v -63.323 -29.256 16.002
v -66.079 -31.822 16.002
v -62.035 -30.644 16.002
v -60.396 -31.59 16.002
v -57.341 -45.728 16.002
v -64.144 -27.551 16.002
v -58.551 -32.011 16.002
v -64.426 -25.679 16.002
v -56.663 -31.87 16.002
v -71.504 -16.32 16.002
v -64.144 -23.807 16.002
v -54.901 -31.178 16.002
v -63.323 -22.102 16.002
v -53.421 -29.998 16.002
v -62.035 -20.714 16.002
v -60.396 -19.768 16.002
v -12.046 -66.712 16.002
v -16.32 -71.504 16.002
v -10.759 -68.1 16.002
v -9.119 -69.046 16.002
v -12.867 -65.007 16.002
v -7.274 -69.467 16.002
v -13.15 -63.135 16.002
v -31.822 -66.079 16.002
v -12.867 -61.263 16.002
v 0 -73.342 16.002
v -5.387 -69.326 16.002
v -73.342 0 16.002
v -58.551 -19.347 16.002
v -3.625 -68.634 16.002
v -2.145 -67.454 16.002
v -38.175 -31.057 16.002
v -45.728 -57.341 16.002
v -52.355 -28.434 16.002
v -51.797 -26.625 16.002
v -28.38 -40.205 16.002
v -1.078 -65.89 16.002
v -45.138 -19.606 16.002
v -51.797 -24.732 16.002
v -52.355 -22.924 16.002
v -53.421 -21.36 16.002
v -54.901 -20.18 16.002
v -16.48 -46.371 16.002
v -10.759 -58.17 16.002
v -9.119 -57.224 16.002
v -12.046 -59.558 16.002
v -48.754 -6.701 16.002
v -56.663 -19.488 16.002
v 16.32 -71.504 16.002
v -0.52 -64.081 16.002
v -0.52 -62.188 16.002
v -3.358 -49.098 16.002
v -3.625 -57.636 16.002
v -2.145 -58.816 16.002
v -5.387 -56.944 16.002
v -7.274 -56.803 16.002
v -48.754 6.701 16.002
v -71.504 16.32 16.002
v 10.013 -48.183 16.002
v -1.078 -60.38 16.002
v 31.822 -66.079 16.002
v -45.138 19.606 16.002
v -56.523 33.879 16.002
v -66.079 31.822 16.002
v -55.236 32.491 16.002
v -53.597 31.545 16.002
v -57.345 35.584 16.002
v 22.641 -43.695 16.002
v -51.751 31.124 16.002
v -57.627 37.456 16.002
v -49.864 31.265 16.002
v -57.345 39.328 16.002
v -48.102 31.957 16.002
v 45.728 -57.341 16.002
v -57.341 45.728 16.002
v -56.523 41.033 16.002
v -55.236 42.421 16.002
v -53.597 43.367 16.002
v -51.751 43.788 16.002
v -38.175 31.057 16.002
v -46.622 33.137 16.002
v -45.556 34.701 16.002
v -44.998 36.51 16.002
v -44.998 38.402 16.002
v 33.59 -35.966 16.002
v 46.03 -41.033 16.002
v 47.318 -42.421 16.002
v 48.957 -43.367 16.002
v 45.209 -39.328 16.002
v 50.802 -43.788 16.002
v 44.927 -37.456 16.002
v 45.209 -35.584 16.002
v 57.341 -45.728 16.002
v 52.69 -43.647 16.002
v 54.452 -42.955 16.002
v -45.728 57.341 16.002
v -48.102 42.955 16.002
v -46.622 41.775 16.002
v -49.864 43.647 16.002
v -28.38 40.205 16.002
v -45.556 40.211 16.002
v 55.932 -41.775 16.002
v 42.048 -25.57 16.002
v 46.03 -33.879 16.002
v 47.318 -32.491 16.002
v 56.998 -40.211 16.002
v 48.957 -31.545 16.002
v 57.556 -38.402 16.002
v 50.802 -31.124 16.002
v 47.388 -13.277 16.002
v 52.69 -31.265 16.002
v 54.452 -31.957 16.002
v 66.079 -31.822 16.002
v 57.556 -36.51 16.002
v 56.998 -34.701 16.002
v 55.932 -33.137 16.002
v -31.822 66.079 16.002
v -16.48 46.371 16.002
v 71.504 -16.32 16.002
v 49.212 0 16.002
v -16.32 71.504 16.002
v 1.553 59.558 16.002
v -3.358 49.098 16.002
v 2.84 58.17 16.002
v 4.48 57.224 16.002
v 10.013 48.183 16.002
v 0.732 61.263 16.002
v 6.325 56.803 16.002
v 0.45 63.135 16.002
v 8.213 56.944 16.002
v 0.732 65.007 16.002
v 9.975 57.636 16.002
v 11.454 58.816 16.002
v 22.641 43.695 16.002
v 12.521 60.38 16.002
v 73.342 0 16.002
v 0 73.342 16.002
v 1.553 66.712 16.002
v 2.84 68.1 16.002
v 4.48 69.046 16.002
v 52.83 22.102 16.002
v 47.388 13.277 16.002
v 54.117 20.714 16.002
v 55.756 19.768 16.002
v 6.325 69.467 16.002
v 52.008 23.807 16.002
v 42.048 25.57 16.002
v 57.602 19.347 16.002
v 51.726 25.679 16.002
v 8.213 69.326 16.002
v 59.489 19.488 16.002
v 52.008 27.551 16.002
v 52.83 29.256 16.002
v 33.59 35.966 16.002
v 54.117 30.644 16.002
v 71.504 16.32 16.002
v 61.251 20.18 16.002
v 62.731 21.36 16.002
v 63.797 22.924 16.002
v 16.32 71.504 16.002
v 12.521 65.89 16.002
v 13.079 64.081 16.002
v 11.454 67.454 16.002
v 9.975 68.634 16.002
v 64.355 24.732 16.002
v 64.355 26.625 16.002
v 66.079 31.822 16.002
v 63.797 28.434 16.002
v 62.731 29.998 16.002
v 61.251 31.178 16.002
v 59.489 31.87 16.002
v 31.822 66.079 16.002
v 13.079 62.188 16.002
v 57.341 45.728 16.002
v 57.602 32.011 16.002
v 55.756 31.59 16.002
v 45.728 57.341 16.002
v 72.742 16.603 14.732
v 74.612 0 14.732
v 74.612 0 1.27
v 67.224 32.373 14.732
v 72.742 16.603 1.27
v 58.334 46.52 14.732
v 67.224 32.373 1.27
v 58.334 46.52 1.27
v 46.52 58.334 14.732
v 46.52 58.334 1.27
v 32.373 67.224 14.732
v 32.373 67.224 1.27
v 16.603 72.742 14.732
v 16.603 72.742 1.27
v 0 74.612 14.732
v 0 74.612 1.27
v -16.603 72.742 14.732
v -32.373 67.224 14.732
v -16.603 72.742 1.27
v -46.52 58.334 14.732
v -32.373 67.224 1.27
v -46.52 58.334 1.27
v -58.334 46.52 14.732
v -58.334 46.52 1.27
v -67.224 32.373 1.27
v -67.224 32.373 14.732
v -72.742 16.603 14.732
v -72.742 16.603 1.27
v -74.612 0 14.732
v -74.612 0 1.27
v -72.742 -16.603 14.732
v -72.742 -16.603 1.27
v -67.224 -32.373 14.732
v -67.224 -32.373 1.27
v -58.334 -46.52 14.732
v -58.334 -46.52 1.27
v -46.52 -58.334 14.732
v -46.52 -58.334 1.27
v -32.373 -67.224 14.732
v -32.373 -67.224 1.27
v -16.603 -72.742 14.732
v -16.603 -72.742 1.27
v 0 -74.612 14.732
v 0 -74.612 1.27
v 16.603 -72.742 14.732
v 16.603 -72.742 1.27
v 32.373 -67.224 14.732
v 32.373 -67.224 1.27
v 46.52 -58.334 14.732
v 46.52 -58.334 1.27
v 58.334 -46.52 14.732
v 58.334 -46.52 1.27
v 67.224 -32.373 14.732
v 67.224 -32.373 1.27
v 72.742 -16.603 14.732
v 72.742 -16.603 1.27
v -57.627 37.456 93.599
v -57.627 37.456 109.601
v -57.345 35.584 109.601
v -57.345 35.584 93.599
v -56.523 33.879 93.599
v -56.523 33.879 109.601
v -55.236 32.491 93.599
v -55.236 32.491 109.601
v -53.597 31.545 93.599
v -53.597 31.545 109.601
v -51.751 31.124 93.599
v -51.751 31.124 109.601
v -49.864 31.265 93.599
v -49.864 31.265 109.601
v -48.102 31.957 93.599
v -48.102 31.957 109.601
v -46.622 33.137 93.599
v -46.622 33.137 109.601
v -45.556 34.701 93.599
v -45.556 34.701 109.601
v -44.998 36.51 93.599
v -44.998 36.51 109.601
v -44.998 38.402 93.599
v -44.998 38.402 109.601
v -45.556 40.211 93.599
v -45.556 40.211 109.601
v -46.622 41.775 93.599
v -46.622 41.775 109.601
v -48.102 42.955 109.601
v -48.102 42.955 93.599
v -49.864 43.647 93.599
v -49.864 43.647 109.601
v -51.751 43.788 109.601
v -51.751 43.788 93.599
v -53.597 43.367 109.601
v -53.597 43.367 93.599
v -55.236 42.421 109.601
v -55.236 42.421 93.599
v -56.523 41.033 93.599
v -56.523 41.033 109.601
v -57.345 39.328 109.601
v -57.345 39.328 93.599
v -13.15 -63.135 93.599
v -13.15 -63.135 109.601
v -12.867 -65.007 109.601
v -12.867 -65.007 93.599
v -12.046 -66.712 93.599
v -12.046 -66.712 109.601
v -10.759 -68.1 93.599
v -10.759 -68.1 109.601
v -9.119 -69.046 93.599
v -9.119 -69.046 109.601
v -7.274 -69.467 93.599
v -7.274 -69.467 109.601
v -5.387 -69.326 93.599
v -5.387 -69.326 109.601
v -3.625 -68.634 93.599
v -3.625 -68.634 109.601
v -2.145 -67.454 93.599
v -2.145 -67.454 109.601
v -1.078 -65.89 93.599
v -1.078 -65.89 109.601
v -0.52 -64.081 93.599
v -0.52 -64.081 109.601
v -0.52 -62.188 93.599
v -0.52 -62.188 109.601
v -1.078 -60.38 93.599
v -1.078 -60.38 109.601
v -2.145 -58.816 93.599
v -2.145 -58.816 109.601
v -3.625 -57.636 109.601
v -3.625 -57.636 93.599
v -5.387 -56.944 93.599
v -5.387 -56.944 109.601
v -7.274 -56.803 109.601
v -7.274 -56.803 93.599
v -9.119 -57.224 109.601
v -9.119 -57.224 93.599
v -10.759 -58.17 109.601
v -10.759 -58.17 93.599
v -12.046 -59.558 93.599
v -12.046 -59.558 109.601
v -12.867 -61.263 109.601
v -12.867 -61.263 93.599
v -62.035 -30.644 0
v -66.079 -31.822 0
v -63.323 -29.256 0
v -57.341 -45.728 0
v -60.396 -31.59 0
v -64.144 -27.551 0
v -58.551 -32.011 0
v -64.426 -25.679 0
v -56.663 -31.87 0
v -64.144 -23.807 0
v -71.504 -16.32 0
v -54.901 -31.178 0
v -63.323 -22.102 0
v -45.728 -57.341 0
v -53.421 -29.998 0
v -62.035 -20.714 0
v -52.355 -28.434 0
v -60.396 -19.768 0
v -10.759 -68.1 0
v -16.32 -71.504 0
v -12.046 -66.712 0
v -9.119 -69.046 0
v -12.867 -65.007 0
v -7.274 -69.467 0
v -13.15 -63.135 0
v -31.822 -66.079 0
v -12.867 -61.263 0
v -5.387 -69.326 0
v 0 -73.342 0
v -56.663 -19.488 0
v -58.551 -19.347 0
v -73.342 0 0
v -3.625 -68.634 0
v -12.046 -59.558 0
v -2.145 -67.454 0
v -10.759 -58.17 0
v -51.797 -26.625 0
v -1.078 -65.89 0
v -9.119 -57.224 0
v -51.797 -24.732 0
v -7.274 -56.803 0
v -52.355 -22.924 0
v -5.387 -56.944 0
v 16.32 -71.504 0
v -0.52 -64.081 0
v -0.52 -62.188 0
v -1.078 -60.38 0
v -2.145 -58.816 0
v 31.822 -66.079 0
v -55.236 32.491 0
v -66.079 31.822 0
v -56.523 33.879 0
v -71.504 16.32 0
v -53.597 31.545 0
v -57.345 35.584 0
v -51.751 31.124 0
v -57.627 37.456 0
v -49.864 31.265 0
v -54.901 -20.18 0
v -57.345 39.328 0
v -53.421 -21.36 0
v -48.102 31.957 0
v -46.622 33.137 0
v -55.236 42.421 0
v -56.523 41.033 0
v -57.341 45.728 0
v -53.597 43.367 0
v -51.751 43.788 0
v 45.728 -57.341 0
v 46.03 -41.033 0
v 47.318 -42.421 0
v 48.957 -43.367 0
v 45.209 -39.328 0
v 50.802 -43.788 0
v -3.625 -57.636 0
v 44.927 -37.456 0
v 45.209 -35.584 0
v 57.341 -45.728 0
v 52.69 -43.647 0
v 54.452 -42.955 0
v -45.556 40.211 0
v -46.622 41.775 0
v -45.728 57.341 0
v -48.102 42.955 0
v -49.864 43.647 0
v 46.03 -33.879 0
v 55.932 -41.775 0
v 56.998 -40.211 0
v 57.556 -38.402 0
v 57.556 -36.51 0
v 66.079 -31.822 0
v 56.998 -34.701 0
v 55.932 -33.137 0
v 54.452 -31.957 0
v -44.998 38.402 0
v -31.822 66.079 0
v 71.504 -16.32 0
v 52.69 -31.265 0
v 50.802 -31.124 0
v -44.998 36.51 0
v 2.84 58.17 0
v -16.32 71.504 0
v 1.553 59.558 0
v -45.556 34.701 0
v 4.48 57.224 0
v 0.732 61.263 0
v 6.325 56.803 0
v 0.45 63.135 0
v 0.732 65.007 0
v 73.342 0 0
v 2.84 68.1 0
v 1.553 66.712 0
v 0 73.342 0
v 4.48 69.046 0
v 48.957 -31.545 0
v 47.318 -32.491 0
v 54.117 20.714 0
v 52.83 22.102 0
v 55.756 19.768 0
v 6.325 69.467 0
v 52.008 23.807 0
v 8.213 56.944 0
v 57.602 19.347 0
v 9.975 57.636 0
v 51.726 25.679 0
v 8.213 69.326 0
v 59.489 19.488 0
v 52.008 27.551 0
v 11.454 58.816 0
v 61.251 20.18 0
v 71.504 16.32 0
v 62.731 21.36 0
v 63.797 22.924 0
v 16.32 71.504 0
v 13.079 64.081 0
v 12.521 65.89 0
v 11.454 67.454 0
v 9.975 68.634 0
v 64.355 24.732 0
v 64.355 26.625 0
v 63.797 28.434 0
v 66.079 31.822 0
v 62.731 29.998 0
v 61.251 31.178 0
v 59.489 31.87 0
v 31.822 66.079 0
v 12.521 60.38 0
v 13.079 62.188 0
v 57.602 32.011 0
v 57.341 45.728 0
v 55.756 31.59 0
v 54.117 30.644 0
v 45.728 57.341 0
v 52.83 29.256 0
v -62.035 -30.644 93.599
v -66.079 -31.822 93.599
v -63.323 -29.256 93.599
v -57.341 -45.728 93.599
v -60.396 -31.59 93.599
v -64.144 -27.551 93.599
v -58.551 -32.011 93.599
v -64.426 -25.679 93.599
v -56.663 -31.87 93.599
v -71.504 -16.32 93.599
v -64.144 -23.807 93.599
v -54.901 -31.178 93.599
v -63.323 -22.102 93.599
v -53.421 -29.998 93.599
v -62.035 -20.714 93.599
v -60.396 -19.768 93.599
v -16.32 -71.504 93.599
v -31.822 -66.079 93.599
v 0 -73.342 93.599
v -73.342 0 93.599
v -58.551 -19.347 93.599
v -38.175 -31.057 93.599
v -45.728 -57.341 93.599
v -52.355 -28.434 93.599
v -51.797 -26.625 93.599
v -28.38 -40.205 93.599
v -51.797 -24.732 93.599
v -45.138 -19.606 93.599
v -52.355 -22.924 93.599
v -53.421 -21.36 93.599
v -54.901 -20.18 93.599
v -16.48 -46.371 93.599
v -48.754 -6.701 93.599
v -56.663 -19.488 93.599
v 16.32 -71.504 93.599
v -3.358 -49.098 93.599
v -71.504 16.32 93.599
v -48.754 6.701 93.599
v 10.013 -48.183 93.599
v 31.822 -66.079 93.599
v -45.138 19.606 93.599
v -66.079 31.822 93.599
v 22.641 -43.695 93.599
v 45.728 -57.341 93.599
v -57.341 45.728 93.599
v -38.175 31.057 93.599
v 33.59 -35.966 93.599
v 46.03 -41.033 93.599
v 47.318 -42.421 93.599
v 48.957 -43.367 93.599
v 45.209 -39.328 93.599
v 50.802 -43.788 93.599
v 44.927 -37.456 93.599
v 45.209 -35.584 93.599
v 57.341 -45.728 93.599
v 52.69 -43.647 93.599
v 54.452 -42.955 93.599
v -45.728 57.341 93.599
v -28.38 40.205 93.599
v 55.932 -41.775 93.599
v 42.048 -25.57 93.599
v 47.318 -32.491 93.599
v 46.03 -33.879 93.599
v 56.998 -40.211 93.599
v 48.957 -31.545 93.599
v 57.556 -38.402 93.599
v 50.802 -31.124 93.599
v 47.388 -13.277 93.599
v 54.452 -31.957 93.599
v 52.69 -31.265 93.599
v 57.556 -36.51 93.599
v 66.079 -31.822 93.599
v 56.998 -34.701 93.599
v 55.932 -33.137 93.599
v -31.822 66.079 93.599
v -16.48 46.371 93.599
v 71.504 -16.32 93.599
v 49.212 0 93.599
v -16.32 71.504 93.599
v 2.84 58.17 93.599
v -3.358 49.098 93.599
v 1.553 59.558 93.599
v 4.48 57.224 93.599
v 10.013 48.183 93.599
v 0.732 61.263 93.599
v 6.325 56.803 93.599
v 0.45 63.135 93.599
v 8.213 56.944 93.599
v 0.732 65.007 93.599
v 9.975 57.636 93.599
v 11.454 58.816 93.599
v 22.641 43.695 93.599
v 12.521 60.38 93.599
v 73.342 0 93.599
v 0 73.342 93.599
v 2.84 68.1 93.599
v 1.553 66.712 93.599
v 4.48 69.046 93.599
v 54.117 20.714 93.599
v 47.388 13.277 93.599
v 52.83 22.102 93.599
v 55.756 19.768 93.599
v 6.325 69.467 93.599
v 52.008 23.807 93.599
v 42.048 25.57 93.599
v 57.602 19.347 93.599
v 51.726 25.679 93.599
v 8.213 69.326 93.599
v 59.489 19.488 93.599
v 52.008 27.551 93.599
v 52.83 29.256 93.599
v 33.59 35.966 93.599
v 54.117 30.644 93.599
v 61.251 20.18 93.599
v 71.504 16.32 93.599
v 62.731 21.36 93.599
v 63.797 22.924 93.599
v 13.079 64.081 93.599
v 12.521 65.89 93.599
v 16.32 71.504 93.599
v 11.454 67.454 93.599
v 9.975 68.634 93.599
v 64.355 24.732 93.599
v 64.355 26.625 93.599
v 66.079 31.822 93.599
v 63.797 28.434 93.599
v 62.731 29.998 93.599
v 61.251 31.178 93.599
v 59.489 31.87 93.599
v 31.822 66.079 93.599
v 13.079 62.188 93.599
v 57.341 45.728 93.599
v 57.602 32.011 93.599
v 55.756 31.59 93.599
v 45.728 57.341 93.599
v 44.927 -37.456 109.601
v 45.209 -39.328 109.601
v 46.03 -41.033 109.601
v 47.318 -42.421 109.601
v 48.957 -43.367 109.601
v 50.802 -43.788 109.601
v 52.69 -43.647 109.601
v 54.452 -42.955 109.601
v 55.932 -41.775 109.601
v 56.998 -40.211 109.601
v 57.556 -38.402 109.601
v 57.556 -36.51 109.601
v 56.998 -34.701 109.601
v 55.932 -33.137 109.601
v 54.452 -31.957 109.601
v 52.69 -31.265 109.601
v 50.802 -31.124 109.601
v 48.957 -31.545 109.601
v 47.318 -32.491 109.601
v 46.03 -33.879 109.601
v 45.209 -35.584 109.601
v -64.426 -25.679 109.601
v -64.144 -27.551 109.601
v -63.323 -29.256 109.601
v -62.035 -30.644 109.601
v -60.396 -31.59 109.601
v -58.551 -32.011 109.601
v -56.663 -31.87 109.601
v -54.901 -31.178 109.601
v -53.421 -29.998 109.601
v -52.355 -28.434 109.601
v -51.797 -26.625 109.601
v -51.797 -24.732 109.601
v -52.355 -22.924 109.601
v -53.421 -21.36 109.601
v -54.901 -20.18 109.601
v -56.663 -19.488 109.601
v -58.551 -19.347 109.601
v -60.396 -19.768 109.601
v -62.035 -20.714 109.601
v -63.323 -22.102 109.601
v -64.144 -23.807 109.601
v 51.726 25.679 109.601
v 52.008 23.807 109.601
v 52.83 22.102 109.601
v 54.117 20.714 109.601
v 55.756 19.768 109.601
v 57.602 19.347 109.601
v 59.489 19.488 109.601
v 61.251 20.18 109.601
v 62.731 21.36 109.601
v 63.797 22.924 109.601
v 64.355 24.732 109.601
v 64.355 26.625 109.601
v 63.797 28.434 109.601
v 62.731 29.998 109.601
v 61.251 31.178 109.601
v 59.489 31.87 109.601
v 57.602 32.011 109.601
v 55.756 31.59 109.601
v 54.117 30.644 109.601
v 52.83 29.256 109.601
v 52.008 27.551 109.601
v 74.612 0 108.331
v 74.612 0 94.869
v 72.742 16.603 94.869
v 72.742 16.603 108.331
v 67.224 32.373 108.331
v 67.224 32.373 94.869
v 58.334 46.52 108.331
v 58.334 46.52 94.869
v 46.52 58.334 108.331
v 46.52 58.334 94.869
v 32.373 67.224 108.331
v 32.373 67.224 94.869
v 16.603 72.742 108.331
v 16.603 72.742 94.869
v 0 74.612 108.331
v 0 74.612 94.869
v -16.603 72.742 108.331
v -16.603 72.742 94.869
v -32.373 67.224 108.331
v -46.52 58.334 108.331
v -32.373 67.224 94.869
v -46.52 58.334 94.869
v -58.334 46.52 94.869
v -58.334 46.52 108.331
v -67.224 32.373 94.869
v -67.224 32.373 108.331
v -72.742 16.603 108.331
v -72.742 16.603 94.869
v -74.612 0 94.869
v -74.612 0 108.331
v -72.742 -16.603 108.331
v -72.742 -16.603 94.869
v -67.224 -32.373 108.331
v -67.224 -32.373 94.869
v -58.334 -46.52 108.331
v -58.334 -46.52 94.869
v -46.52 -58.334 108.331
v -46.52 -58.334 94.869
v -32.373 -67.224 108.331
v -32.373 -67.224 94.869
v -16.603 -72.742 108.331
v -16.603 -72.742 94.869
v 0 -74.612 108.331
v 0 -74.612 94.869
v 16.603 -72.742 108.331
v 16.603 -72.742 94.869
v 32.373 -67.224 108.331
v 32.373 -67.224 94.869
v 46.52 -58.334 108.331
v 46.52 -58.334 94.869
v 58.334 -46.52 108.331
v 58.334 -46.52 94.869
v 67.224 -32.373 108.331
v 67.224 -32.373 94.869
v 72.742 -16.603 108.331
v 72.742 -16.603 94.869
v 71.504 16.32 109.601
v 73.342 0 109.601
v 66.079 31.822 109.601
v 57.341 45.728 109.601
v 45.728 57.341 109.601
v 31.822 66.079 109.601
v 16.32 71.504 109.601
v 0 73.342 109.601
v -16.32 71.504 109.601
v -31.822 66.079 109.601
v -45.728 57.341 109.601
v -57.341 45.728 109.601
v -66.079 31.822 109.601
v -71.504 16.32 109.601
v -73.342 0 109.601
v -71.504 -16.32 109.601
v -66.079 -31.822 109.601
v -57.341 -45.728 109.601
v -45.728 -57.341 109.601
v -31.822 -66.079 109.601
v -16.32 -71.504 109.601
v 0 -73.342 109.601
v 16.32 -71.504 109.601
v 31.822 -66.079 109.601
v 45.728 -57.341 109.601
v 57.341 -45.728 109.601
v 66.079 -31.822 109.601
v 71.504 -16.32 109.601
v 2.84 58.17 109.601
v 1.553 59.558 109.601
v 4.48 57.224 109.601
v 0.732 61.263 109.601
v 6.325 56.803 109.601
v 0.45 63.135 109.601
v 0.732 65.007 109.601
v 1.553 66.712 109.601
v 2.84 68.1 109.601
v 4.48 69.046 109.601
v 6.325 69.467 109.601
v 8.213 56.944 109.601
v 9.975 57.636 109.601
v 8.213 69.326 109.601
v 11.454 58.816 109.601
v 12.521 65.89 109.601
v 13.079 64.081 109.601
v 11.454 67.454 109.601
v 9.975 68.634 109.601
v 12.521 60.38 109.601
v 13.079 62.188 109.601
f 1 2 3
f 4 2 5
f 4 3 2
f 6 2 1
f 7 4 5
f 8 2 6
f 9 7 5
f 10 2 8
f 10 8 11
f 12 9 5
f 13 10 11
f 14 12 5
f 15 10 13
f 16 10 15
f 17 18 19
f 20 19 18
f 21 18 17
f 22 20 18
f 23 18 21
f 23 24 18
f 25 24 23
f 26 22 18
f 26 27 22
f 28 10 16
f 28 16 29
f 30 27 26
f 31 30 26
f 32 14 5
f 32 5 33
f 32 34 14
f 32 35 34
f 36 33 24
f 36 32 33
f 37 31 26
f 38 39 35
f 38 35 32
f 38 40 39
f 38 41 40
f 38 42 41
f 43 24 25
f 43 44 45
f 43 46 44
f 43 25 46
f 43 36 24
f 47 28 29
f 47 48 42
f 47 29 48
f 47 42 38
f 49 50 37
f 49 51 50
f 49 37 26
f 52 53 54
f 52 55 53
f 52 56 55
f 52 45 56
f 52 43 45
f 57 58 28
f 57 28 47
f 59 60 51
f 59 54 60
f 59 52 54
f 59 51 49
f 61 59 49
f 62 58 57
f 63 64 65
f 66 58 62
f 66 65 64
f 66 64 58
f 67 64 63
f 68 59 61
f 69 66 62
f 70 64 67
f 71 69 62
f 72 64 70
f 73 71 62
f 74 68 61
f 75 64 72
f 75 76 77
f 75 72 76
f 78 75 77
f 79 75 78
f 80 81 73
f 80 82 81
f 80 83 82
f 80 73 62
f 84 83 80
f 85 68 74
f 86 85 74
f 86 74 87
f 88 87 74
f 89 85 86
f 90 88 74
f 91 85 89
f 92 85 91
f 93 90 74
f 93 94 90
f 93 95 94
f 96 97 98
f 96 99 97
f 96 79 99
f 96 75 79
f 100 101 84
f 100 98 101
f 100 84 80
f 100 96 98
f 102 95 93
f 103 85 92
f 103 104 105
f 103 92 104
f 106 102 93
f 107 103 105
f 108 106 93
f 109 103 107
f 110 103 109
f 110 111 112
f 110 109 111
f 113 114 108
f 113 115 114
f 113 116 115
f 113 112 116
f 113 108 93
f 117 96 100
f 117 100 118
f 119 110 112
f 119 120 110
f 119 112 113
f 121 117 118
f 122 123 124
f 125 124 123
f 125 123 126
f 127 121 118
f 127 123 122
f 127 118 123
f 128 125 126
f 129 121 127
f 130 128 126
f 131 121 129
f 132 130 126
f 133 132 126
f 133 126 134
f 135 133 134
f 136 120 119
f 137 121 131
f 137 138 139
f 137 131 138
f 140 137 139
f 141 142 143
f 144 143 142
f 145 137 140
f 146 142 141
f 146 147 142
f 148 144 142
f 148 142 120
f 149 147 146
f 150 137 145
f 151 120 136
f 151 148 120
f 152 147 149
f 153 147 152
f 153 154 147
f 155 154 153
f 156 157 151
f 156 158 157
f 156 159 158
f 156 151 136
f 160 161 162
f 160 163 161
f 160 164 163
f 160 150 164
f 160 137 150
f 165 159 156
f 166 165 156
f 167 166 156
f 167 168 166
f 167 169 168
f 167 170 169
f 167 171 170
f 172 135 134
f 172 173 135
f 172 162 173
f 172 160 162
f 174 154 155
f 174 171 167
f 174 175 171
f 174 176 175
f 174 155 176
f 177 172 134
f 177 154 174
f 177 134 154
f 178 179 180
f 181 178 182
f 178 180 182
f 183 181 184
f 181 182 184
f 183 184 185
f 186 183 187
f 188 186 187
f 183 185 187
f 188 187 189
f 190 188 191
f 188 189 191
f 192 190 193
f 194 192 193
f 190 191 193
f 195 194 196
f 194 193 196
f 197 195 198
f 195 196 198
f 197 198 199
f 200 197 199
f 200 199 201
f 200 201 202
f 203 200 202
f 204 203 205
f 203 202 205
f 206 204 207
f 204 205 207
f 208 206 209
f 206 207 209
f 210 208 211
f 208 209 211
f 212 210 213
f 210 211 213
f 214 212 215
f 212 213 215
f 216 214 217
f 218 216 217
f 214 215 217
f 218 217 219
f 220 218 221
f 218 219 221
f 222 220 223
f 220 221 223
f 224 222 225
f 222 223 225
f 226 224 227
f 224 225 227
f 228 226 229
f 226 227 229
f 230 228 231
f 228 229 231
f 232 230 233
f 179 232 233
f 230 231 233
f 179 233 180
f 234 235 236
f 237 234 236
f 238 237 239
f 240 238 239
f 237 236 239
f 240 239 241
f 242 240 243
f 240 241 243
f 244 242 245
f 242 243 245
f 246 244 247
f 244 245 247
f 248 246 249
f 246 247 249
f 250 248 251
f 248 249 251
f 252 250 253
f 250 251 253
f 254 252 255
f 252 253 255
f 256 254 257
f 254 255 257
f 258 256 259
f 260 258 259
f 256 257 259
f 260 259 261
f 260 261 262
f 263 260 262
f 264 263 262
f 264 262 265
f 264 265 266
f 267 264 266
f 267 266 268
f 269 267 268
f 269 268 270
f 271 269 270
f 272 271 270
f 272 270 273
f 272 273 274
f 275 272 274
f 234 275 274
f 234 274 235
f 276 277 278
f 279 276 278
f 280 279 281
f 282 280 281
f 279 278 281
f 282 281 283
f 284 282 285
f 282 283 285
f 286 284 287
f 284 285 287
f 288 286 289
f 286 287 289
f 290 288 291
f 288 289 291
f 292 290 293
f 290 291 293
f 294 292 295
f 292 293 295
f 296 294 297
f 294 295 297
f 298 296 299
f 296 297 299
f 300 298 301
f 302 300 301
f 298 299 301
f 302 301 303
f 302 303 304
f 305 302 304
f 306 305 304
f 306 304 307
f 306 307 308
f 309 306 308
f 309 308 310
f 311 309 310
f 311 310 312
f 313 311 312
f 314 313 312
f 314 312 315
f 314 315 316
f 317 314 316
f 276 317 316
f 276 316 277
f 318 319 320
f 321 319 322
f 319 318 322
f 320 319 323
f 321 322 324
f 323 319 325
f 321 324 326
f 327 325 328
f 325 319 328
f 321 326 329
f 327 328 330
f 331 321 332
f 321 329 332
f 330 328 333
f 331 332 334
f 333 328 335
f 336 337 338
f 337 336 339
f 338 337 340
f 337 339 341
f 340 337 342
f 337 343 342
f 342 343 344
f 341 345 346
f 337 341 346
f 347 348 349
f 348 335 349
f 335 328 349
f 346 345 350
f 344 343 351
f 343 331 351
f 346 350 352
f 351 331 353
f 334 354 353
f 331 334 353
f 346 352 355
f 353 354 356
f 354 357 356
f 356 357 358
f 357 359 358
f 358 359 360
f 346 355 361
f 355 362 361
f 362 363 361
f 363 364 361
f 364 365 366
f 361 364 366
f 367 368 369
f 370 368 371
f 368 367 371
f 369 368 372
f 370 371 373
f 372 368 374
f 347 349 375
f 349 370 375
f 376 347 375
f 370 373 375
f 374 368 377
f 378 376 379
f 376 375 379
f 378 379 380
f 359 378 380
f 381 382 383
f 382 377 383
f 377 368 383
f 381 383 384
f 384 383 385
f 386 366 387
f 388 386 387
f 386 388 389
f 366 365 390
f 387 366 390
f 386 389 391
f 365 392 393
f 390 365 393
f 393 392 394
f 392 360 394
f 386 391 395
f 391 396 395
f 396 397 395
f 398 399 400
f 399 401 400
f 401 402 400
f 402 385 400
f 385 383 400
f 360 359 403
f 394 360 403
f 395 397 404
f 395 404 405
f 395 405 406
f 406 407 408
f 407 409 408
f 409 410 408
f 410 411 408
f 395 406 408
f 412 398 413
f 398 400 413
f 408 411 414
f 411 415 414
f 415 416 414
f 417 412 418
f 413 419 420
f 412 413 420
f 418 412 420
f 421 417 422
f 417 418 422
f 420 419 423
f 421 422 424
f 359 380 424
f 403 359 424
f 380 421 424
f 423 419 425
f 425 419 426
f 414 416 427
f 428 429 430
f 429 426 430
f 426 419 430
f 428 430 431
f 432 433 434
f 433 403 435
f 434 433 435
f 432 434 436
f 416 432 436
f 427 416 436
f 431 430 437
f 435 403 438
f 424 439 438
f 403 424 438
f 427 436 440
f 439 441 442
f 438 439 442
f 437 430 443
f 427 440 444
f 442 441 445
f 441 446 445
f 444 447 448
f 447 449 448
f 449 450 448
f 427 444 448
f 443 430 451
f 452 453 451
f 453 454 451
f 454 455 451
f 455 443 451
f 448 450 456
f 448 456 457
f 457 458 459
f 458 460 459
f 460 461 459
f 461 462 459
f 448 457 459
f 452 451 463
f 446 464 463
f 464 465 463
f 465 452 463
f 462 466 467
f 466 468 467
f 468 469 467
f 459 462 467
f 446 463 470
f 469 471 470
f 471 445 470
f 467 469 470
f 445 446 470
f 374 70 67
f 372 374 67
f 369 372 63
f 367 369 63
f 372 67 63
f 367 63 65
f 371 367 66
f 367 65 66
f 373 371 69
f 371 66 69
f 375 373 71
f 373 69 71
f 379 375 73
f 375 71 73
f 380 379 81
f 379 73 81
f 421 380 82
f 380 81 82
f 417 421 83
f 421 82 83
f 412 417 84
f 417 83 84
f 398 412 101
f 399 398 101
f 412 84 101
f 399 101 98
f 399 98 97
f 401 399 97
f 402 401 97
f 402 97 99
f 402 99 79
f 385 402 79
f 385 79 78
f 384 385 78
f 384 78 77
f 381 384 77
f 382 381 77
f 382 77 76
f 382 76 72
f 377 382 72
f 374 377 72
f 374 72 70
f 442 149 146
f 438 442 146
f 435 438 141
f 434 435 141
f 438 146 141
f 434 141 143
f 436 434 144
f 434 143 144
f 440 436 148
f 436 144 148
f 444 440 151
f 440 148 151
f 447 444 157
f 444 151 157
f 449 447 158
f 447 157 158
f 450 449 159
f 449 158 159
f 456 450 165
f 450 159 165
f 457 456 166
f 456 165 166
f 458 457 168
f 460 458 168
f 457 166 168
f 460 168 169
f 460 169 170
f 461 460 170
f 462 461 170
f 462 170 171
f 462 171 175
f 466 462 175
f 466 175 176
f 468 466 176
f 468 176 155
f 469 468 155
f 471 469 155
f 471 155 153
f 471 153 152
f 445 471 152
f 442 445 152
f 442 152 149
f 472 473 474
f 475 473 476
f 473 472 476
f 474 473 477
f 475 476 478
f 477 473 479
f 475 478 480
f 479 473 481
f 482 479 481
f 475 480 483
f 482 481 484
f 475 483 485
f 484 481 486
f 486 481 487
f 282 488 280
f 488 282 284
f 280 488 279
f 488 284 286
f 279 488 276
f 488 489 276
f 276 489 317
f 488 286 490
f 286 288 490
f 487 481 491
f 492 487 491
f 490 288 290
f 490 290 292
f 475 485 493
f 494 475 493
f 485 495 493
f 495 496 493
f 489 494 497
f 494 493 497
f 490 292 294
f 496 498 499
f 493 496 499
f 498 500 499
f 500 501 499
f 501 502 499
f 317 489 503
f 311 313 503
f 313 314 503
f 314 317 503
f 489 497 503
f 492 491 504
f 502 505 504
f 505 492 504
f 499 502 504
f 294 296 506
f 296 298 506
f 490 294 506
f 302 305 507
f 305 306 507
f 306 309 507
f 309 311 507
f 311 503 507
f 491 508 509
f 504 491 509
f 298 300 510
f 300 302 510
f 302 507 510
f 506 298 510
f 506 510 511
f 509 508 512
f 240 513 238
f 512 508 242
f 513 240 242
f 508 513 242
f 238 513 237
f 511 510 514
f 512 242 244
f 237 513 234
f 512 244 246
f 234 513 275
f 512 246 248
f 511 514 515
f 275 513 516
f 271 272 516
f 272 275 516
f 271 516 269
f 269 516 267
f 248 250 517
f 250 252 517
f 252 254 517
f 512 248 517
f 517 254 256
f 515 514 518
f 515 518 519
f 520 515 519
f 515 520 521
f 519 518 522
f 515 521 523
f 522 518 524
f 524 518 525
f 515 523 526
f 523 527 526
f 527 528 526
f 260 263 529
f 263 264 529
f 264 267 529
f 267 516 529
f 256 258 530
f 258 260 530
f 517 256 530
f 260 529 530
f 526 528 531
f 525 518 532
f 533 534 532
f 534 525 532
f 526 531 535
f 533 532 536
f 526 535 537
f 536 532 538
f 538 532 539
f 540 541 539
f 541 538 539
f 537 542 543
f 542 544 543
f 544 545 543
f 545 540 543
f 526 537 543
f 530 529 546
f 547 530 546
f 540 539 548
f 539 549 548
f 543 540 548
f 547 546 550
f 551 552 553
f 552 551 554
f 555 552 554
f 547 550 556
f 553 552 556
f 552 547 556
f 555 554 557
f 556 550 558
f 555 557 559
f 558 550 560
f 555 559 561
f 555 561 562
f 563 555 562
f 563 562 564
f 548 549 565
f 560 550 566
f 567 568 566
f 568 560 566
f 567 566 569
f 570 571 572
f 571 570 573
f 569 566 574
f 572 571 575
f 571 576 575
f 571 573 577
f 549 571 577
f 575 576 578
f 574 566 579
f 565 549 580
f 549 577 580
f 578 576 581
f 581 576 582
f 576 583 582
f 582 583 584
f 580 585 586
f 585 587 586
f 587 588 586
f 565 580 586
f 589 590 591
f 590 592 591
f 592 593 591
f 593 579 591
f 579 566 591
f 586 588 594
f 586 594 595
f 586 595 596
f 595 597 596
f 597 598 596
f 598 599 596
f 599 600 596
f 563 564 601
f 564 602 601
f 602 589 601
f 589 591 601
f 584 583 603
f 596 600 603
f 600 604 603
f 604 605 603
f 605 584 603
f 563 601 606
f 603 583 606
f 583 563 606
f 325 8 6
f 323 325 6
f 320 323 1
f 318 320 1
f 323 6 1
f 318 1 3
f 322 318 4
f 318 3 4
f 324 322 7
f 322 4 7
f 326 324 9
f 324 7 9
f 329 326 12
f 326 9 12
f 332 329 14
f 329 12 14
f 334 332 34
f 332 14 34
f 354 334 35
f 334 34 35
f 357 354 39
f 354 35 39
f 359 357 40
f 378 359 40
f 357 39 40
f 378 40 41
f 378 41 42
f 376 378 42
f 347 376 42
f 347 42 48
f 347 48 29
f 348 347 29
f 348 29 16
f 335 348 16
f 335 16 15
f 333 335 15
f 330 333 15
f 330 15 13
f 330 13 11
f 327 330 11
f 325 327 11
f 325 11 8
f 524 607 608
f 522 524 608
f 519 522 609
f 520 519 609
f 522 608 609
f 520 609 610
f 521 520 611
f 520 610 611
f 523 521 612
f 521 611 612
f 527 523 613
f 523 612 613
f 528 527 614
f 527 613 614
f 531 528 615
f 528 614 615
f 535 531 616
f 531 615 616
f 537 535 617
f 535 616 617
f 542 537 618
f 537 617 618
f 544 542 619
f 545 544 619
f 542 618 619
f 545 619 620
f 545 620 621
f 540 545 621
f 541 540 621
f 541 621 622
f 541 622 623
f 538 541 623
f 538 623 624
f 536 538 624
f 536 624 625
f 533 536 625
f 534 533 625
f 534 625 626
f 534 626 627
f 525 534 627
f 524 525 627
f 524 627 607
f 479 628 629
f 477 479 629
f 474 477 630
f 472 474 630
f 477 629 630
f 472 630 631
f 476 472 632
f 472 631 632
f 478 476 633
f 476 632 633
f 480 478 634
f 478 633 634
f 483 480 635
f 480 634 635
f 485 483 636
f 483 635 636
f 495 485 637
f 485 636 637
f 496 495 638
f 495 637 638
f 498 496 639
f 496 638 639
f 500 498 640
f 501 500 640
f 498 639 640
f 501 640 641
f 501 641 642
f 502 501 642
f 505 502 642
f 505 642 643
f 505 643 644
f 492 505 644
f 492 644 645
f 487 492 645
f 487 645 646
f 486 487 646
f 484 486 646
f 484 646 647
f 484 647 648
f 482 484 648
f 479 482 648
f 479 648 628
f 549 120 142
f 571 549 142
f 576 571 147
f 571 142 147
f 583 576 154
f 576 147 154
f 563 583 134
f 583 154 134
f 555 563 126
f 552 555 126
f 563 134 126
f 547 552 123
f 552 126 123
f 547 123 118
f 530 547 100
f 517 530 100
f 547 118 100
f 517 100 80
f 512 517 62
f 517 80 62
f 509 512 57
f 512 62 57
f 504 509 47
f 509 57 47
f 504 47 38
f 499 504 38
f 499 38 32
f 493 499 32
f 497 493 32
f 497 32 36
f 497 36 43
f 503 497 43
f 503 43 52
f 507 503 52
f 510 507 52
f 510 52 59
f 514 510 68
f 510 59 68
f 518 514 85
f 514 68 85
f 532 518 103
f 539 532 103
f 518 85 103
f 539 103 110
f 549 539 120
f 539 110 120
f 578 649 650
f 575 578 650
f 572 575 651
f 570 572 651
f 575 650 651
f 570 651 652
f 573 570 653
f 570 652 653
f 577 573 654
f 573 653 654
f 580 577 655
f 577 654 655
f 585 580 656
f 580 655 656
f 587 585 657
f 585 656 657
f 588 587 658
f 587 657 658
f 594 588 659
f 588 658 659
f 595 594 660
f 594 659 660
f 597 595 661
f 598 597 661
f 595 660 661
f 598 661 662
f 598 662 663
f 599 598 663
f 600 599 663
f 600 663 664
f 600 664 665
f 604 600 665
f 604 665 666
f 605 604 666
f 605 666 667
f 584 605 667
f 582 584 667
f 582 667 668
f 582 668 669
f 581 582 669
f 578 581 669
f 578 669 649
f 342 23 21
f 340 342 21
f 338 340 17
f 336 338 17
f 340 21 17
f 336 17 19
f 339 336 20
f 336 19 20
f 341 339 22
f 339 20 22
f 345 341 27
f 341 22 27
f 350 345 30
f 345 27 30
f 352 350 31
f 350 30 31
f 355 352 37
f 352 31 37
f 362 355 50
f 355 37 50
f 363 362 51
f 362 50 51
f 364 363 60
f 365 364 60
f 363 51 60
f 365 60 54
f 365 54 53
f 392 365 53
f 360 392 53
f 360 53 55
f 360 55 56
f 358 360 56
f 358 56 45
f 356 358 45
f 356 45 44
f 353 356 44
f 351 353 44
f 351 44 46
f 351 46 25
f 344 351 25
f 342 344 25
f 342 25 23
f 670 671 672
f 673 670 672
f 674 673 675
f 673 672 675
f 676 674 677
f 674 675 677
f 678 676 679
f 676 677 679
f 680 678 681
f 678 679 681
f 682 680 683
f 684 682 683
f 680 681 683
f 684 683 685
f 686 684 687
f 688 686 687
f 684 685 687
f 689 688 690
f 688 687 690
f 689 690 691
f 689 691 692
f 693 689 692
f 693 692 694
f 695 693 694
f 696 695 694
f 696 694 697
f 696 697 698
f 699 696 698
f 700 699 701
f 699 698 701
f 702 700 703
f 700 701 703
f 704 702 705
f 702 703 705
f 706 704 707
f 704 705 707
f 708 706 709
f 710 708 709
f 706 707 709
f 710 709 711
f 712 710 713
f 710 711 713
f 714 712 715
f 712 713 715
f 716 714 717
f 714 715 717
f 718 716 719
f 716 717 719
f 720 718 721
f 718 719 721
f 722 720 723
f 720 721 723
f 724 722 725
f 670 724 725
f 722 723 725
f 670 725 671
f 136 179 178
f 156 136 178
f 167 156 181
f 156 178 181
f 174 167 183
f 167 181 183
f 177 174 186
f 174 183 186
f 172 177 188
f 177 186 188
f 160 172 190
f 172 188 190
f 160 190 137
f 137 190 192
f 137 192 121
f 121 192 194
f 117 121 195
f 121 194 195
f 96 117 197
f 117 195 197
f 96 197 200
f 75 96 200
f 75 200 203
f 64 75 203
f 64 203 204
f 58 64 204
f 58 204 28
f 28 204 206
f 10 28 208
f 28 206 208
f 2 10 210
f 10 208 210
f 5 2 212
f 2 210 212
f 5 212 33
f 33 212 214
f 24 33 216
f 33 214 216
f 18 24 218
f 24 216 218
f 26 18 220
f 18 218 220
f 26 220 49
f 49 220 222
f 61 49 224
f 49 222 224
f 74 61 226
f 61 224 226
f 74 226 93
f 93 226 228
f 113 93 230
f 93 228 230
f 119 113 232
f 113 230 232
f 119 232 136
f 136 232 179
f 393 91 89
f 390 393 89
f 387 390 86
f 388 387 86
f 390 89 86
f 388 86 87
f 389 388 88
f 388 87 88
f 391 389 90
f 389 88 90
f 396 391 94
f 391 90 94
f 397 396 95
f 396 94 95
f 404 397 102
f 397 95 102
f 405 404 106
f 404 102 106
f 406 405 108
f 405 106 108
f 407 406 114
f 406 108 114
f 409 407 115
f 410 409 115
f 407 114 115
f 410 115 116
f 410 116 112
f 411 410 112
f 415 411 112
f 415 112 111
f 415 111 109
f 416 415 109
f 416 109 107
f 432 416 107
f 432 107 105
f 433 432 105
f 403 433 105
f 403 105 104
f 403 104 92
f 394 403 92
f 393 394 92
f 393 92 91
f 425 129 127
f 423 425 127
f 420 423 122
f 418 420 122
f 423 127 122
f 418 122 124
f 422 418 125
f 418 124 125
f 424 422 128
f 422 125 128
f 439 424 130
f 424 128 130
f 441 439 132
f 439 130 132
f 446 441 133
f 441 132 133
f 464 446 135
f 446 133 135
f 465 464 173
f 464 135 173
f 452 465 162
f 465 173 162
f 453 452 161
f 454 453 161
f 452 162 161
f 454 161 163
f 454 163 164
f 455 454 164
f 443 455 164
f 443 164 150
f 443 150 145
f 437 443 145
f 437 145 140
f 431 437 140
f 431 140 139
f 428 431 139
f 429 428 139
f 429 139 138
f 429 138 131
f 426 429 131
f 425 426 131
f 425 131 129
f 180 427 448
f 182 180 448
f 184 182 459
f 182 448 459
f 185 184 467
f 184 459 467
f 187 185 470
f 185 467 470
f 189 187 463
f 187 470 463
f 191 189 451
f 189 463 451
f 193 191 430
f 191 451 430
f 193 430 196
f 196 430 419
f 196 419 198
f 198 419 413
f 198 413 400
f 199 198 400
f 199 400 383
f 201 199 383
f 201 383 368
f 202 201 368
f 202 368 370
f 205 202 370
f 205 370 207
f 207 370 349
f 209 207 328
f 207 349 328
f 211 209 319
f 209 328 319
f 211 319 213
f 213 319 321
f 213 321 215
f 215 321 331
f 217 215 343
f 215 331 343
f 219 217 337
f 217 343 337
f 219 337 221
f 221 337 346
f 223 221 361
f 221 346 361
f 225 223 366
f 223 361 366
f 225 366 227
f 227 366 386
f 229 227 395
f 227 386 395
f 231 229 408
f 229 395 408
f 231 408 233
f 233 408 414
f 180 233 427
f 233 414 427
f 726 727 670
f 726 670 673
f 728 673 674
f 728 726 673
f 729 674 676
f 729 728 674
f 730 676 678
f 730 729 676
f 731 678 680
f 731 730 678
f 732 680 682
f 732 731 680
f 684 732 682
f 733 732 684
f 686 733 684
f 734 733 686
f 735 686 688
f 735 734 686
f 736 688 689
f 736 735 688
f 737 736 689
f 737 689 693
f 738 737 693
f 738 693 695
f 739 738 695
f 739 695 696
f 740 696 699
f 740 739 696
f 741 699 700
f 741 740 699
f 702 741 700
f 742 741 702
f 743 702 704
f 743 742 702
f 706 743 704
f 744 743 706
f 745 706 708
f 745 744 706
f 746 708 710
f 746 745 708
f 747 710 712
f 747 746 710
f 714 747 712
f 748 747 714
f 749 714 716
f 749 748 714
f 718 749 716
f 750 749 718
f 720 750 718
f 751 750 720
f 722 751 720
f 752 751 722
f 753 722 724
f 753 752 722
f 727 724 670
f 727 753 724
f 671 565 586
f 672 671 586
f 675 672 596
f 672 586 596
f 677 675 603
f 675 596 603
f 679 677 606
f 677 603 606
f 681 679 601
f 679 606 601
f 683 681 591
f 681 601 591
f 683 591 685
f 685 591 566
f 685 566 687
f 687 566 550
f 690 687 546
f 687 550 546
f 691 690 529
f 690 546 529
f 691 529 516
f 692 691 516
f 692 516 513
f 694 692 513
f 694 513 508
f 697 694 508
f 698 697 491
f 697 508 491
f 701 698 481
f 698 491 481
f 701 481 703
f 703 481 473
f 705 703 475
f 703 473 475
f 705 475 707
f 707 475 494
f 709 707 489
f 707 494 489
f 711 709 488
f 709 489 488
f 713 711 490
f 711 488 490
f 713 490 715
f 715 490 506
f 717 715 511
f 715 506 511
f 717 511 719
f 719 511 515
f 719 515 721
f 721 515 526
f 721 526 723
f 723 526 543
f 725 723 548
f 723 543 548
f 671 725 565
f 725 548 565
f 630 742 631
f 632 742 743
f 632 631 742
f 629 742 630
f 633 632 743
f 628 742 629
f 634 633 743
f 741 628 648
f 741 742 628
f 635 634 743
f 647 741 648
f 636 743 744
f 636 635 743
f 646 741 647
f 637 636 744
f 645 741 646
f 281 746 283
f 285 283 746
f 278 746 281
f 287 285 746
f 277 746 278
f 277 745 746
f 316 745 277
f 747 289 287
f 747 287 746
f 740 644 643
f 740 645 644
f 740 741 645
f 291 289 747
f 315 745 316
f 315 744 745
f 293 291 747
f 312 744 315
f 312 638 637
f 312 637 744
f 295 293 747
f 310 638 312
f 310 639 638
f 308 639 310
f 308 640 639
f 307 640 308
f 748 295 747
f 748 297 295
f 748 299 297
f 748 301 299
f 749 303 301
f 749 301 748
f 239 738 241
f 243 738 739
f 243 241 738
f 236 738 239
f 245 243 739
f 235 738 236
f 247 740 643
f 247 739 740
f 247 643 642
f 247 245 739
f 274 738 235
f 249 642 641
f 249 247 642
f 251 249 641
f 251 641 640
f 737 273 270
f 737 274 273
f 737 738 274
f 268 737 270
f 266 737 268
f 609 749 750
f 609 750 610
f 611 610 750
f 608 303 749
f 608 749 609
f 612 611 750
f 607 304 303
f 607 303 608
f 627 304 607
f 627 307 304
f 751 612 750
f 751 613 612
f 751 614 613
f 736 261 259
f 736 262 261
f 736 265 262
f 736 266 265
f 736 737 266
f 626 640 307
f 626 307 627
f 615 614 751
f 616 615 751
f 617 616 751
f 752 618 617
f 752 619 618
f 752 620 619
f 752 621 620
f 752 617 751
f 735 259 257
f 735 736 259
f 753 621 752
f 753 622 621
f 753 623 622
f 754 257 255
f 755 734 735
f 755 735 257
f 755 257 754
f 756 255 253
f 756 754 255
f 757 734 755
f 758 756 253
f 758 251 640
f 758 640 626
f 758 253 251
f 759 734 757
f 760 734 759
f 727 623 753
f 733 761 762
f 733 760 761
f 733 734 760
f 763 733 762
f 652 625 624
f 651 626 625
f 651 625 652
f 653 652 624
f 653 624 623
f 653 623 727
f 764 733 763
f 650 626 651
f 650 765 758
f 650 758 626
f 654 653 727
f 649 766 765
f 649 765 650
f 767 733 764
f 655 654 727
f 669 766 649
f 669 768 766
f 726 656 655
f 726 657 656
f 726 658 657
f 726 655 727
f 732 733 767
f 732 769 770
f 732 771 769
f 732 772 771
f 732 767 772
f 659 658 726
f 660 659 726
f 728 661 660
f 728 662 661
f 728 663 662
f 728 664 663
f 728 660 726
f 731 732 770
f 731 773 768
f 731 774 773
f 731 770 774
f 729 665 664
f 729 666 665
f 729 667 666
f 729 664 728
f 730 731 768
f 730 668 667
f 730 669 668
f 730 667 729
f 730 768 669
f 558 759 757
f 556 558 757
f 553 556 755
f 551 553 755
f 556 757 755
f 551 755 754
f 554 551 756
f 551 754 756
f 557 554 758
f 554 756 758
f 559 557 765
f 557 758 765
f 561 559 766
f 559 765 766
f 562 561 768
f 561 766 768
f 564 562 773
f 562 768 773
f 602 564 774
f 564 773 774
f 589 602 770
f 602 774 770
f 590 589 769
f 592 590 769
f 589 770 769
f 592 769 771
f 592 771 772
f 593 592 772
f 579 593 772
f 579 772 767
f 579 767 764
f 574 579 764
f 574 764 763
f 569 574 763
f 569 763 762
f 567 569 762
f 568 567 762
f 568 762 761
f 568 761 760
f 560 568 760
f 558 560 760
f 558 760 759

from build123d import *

# Parameters (mm, degrees)
F0_R     = 74.6125
F1_DEPTH = 16.002
F2_R     = 49.2125
F3_DEPTH = 77.597
F4_R     = 74.6125
F5_DEPTH = 16.002
F6_SIZE  = 1.27
F8_D     = 12.7
F8_DEPTH = 127


with BuildPart() as f1:
    # F0 (on Top) → F1 (new body)
    with BuildSketch(Plane.XY):
        Circle(F0_R)
    extrude(amount=F1_DEPTH)

    # F2 (on face) → F3 (join)
    with BuildSketch(Plane.XY.offset(16.002)):
        Circle(F2_R)
    extrude(amount=F3_DEPTH)

    # F4 (on face) → F5 (join)
    with BuildSketch(Plane.XY.offset(93.599)):
        Circle(F4_R)
    extrude(amount=F5_DEPTH)

    # F6
    f6_edges = [f1.edges().sort_by_distance(p)[0] for p in [
        (-74.6125, 0, 93.599),
        (-74.6125, 0, 109.601),
        (-74.6125, 0, 16.002),
        (-74.6125, 0, 0),
    ]]
    chamfer(f6_edges, length=F6_SIZE)

    # F8
    with Locations(Plane(origin=(0, 0, 0), x_dir=(1, 0, 0), z_dir=(0, 0, -1))):
        with Locations((-51.276663, -37.456026), (-58.076201, 25.67888), (-6.799538, 63.134905), (51.276663, 37.456026), (58.076201, -25.67888), (6.799538, -63.134905)):
            Hole(F8_D / 2, depth=F8_DEPTH)


solid = f1.part
